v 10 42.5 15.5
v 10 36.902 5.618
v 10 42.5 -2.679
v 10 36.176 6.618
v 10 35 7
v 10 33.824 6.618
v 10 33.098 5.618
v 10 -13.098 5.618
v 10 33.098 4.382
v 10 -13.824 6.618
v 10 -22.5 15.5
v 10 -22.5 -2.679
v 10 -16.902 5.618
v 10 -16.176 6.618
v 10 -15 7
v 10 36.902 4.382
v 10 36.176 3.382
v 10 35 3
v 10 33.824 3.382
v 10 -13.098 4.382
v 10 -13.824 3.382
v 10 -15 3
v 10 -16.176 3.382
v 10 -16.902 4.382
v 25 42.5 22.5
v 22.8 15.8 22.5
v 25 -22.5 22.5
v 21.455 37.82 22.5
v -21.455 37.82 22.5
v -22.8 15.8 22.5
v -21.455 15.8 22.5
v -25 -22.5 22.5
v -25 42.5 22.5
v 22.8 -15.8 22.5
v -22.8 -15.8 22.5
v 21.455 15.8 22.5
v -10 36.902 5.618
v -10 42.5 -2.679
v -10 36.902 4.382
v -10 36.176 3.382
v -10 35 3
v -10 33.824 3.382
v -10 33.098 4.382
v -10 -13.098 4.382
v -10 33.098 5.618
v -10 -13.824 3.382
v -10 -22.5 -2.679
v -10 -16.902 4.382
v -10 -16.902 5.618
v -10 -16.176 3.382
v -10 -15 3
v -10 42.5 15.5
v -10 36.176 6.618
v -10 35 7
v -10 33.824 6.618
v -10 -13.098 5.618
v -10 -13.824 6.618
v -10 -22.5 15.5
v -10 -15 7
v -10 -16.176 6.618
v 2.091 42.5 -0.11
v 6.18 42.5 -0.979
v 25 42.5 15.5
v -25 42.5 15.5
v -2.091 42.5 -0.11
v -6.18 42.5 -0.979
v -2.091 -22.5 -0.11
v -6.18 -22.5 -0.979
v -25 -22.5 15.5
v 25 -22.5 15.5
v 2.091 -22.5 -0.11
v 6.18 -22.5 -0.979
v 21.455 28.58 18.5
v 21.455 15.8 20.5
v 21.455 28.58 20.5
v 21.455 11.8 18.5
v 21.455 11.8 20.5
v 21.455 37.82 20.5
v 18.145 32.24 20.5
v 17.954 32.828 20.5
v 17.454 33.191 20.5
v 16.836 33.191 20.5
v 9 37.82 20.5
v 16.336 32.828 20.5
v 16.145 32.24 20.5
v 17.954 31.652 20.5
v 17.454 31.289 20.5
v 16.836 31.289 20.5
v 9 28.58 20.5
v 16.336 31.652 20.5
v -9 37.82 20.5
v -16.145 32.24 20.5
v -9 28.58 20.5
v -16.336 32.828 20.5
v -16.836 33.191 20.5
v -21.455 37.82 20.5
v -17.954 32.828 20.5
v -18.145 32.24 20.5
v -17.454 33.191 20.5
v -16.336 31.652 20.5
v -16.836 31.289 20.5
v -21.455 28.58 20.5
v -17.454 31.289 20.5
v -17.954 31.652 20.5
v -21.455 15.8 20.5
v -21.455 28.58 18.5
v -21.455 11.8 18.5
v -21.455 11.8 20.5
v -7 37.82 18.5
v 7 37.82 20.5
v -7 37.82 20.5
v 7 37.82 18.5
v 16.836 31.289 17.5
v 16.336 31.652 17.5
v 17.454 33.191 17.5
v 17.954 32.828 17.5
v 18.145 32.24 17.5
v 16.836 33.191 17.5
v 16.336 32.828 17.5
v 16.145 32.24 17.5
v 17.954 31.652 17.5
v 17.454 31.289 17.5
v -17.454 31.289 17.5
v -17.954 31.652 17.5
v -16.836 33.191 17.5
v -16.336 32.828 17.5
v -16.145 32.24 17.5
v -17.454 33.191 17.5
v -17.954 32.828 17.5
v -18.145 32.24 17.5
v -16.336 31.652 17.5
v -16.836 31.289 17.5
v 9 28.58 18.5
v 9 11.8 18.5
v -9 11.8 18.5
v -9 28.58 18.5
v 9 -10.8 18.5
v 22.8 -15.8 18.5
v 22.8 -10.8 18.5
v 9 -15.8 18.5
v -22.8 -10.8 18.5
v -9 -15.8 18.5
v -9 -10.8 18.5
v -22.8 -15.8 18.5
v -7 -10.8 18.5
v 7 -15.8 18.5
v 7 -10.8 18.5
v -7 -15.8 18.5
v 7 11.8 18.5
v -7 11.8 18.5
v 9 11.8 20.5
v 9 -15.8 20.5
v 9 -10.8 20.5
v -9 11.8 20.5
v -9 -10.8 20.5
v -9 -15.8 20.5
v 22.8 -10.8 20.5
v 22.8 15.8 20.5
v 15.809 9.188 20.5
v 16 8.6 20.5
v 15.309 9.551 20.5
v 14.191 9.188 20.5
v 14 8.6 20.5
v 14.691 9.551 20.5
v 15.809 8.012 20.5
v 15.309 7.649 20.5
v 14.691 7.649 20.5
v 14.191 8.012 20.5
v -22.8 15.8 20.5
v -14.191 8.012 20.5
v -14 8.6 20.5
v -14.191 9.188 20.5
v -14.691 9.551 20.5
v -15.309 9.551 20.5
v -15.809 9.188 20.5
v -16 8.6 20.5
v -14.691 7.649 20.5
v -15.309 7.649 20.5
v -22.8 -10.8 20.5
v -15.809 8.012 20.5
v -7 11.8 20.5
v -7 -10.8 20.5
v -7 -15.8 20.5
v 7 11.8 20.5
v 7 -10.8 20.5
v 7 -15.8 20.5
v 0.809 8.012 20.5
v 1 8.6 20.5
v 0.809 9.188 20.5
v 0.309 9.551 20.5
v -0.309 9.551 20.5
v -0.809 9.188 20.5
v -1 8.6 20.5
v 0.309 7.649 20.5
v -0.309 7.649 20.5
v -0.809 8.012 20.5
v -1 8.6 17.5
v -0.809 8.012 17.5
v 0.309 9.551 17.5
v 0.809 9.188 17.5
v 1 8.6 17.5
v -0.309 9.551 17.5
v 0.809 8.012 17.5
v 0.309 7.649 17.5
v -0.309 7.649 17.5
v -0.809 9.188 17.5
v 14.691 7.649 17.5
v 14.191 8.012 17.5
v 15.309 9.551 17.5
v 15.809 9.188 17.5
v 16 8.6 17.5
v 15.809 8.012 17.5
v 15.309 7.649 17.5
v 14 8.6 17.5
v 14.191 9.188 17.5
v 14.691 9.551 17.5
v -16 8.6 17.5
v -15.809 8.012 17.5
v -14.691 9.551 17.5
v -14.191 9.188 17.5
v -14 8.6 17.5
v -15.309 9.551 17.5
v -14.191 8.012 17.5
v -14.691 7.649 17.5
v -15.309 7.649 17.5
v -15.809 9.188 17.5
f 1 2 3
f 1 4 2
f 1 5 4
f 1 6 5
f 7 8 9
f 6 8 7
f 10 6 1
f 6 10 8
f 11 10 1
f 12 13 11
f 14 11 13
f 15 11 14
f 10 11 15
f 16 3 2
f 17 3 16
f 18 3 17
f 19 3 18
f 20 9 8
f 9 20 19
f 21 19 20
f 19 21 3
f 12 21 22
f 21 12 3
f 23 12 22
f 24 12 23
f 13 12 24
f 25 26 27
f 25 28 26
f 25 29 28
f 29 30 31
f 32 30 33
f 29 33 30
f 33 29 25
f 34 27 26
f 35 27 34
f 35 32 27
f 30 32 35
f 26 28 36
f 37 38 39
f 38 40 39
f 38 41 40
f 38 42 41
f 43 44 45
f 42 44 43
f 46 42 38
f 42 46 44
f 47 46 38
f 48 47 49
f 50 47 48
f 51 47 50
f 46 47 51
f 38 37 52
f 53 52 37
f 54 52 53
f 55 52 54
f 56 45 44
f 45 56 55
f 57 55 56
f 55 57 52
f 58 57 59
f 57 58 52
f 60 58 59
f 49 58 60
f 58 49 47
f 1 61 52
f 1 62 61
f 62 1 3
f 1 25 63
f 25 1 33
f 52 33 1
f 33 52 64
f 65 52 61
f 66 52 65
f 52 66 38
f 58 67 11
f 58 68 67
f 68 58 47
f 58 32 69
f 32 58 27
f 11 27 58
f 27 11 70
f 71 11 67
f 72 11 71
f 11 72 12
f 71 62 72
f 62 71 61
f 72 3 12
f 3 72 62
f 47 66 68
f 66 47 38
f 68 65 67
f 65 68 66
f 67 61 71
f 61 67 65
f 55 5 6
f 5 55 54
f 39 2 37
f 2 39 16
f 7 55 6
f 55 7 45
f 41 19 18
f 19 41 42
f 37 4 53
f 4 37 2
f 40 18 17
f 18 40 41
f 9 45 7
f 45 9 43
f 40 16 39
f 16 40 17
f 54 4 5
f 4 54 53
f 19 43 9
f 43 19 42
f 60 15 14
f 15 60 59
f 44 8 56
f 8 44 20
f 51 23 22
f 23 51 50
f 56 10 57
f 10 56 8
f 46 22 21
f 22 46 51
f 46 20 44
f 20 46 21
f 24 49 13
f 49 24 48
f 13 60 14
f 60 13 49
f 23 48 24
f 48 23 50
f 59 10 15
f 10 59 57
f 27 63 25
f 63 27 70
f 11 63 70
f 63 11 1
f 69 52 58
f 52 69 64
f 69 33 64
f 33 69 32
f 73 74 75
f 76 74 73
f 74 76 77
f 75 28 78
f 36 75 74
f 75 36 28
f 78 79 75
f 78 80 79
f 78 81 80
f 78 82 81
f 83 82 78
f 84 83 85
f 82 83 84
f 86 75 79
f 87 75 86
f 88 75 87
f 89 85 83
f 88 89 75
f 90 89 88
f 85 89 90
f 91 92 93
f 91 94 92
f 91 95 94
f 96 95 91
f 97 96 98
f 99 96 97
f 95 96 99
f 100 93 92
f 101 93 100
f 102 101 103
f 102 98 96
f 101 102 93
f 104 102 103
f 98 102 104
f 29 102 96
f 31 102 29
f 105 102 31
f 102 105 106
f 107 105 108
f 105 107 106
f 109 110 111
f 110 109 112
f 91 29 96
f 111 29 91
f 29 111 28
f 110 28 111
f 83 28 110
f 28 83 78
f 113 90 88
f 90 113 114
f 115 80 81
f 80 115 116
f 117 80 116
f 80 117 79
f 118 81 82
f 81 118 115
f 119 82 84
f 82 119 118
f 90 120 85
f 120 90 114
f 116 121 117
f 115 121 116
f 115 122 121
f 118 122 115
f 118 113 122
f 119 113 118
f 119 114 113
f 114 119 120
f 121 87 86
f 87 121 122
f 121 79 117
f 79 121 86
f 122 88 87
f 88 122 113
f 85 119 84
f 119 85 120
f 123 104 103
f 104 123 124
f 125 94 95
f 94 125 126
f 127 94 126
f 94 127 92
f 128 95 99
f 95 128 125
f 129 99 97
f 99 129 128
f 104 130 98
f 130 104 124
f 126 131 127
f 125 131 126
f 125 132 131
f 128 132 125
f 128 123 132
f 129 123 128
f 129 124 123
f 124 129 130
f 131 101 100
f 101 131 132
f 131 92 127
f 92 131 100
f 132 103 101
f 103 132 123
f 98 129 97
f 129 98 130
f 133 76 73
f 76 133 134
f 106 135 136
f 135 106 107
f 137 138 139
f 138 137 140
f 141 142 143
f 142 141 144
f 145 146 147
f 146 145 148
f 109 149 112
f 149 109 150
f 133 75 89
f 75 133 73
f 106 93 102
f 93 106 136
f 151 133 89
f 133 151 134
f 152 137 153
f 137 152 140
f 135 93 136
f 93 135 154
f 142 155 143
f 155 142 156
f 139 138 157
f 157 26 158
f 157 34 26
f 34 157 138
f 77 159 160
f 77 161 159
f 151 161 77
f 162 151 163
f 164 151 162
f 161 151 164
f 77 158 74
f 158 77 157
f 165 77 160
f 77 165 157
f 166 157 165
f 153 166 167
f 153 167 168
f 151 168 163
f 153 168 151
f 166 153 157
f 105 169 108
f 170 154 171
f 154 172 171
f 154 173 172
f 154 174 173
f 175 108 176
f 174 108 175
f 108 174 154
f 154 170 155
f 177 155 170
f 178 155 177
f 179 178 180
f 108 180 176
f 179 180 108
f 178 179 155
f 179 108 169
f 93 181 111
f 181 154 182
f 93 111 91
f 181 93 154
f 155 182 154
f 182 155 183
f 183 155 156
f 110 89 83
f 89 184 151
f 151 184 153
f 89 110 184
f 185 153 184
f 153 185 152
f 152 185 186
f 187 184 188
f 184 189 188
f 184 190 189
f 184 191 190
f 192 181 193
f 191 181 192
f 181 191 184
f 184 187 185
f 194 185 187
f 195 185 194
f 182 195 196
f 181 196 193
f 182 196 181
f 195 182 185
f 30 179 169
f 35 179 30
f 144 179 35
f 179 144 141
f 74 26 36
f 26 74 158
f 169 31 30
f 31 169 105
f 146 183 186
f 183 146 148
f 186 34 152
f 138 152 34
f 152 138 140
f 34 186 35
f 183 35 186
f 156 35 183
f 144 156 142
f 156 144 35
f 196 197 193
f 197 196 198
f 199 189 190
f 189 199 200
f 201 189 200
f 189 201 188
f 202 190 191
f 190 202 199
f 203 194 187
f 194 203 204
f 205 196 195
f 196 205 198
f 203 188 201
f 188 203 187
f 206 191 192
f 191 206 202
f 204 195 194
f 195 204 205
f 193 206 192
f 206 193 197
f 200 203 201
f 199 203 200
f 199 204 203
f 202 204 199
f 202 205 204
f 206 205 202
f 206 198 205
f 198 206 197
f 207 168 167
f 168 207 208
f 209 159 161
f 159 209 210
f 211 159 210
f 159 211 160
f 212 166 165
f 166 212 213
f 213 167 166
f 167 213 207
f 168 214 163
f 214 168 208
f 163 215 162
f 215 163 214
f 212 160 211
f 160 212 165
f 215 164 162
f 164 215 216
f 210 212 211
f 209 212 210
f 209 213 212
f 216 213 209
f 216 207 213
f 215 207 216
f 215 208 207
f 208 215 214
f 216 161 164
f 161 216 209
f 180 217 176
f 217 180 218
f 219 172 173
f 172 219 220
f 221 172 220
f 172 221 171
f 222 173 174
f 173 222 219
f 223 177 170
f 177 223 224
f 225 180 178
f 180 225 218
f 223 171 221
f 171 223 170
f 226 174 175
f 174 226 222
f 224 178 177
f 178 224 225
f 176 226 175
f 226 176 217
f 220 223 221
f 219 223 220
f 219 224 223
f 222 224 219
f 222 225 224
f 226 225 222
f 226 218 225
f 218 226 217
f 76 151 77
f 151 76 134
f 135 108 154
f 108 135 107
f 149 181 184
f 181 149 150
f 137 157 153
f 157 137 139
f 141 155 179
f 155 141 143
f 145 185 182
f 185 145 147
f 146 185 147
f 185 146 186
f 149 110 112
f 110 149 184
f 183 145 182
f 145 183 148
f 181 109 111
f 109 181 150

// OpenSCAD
grubosc = 45;
grubosc_skrzydelek = 7;
szerokosc_hall = 14.2;
dlugosc_hall = 31.2;
odstep = 1.5;
wkret_sr = 2;

sz_plytka = 15.24;
dl_plyrka = 41.91;
odstep_plytka = 6.2;
plytka_marg = 1;

module wanna(h){
    difference(){
        cube([20,50,h],center = true);
        
        translate([0,0,h/2]){
        #cube([15, 33, 4],center=true);
        }
    }
}

module trzon(){
    difference(){
    cube([20,65,grubosc],center = true);
    
    translate([0,0,-20]){
        rotate([90,0,0]){
            #cylinder(h=80, r=20, center=true);
        }
    }
    
    translate([0,25,5]){
        rotate([0,90,0]){
            #cylinder(h=60, r=2, center=true, $fn=10);
        }
    }
        translate([0,-25,5]){
        rotate([0,90,0]){
            #cylinder(h=60, r=2, center=true, $fn=10);
        }
    }
}
}

module wkret(){
    translate([0,15.6-7,grubosc/2]){
      #cylinder(h=10, d=wkret_sr, center=true, $fn=10);
    }
}

union(){
difference(){
union(){
    translate([0,10,0])
    trzon();
    translate([0,10,grubosc/2-grubosc_skrzydelek/2]){
    cube([50,65,grubosc_skrzydelek], center = true);
    }
    //translate([0,0,grubosc/2]){
      //  #cube([15, 33, 4],center=true);}
}
        translate([0,0,grubosc/2]){
        #cube([szerokosc_hall*3+odstep*2, dlugosc_hall+0.4, 4],center=true);
    }
    
    wkret();
    
    translate([15,0,0]){
    wkret();
    }
    
     translate([-15,0,0]){
    wkret();
    }
    
    translate([0,(dlugosc_hall+0.4)/2-2,grubosc/2])
    #cube([dl_plyrka+plytka_marg, 4, 4+4],center=true);
    
    translate([0,-(dlugosc_hall+0.4)/2+2.5,grubosc/2])
    #cube([szerokosc_hall*3+odstep*2, 5, 4+4],center=true);
    
    translate([0,-4.5+odstep_plytka,0]){
    translate([0,28,grubosc/2])
    #cube([dl_plyrka+plytka_marg, sz_plytka+plytka_marg, 4],center=true);
    
    translate([dl_plyrka/2-3.81,28-15.6+7+sz_plytka/2-5.08,0]){
    wkret();
    }
    
    translate([-dl_plyrka/2+3.81,28-15.6+7+sz_plytka/2-5.08,0]){
    wkret();
    }
    
    translate([0,28-(sz_plytka+plytka_marg)/2+3.5,grubosc/2])
    #cube([dl_plyrka+plytka_marg, 7, 4+4],center=true);
    
    translate([0,28,grubosc/2])
    #cube([18, sz_plytka+plytka_marg, 4+4],center=true);
    
    translate([0,18,grubosc/2])
    #cube([dl_plyrka+plytka_marg, 8, 4+4],center=true);
}


}
    translate([8,10,grubosc/2-3])
    cube([2, 65, 2],center=true);

    translate([-8,10,grubosc/2-3])
    cube([2, 65, 2],center=true);
}
